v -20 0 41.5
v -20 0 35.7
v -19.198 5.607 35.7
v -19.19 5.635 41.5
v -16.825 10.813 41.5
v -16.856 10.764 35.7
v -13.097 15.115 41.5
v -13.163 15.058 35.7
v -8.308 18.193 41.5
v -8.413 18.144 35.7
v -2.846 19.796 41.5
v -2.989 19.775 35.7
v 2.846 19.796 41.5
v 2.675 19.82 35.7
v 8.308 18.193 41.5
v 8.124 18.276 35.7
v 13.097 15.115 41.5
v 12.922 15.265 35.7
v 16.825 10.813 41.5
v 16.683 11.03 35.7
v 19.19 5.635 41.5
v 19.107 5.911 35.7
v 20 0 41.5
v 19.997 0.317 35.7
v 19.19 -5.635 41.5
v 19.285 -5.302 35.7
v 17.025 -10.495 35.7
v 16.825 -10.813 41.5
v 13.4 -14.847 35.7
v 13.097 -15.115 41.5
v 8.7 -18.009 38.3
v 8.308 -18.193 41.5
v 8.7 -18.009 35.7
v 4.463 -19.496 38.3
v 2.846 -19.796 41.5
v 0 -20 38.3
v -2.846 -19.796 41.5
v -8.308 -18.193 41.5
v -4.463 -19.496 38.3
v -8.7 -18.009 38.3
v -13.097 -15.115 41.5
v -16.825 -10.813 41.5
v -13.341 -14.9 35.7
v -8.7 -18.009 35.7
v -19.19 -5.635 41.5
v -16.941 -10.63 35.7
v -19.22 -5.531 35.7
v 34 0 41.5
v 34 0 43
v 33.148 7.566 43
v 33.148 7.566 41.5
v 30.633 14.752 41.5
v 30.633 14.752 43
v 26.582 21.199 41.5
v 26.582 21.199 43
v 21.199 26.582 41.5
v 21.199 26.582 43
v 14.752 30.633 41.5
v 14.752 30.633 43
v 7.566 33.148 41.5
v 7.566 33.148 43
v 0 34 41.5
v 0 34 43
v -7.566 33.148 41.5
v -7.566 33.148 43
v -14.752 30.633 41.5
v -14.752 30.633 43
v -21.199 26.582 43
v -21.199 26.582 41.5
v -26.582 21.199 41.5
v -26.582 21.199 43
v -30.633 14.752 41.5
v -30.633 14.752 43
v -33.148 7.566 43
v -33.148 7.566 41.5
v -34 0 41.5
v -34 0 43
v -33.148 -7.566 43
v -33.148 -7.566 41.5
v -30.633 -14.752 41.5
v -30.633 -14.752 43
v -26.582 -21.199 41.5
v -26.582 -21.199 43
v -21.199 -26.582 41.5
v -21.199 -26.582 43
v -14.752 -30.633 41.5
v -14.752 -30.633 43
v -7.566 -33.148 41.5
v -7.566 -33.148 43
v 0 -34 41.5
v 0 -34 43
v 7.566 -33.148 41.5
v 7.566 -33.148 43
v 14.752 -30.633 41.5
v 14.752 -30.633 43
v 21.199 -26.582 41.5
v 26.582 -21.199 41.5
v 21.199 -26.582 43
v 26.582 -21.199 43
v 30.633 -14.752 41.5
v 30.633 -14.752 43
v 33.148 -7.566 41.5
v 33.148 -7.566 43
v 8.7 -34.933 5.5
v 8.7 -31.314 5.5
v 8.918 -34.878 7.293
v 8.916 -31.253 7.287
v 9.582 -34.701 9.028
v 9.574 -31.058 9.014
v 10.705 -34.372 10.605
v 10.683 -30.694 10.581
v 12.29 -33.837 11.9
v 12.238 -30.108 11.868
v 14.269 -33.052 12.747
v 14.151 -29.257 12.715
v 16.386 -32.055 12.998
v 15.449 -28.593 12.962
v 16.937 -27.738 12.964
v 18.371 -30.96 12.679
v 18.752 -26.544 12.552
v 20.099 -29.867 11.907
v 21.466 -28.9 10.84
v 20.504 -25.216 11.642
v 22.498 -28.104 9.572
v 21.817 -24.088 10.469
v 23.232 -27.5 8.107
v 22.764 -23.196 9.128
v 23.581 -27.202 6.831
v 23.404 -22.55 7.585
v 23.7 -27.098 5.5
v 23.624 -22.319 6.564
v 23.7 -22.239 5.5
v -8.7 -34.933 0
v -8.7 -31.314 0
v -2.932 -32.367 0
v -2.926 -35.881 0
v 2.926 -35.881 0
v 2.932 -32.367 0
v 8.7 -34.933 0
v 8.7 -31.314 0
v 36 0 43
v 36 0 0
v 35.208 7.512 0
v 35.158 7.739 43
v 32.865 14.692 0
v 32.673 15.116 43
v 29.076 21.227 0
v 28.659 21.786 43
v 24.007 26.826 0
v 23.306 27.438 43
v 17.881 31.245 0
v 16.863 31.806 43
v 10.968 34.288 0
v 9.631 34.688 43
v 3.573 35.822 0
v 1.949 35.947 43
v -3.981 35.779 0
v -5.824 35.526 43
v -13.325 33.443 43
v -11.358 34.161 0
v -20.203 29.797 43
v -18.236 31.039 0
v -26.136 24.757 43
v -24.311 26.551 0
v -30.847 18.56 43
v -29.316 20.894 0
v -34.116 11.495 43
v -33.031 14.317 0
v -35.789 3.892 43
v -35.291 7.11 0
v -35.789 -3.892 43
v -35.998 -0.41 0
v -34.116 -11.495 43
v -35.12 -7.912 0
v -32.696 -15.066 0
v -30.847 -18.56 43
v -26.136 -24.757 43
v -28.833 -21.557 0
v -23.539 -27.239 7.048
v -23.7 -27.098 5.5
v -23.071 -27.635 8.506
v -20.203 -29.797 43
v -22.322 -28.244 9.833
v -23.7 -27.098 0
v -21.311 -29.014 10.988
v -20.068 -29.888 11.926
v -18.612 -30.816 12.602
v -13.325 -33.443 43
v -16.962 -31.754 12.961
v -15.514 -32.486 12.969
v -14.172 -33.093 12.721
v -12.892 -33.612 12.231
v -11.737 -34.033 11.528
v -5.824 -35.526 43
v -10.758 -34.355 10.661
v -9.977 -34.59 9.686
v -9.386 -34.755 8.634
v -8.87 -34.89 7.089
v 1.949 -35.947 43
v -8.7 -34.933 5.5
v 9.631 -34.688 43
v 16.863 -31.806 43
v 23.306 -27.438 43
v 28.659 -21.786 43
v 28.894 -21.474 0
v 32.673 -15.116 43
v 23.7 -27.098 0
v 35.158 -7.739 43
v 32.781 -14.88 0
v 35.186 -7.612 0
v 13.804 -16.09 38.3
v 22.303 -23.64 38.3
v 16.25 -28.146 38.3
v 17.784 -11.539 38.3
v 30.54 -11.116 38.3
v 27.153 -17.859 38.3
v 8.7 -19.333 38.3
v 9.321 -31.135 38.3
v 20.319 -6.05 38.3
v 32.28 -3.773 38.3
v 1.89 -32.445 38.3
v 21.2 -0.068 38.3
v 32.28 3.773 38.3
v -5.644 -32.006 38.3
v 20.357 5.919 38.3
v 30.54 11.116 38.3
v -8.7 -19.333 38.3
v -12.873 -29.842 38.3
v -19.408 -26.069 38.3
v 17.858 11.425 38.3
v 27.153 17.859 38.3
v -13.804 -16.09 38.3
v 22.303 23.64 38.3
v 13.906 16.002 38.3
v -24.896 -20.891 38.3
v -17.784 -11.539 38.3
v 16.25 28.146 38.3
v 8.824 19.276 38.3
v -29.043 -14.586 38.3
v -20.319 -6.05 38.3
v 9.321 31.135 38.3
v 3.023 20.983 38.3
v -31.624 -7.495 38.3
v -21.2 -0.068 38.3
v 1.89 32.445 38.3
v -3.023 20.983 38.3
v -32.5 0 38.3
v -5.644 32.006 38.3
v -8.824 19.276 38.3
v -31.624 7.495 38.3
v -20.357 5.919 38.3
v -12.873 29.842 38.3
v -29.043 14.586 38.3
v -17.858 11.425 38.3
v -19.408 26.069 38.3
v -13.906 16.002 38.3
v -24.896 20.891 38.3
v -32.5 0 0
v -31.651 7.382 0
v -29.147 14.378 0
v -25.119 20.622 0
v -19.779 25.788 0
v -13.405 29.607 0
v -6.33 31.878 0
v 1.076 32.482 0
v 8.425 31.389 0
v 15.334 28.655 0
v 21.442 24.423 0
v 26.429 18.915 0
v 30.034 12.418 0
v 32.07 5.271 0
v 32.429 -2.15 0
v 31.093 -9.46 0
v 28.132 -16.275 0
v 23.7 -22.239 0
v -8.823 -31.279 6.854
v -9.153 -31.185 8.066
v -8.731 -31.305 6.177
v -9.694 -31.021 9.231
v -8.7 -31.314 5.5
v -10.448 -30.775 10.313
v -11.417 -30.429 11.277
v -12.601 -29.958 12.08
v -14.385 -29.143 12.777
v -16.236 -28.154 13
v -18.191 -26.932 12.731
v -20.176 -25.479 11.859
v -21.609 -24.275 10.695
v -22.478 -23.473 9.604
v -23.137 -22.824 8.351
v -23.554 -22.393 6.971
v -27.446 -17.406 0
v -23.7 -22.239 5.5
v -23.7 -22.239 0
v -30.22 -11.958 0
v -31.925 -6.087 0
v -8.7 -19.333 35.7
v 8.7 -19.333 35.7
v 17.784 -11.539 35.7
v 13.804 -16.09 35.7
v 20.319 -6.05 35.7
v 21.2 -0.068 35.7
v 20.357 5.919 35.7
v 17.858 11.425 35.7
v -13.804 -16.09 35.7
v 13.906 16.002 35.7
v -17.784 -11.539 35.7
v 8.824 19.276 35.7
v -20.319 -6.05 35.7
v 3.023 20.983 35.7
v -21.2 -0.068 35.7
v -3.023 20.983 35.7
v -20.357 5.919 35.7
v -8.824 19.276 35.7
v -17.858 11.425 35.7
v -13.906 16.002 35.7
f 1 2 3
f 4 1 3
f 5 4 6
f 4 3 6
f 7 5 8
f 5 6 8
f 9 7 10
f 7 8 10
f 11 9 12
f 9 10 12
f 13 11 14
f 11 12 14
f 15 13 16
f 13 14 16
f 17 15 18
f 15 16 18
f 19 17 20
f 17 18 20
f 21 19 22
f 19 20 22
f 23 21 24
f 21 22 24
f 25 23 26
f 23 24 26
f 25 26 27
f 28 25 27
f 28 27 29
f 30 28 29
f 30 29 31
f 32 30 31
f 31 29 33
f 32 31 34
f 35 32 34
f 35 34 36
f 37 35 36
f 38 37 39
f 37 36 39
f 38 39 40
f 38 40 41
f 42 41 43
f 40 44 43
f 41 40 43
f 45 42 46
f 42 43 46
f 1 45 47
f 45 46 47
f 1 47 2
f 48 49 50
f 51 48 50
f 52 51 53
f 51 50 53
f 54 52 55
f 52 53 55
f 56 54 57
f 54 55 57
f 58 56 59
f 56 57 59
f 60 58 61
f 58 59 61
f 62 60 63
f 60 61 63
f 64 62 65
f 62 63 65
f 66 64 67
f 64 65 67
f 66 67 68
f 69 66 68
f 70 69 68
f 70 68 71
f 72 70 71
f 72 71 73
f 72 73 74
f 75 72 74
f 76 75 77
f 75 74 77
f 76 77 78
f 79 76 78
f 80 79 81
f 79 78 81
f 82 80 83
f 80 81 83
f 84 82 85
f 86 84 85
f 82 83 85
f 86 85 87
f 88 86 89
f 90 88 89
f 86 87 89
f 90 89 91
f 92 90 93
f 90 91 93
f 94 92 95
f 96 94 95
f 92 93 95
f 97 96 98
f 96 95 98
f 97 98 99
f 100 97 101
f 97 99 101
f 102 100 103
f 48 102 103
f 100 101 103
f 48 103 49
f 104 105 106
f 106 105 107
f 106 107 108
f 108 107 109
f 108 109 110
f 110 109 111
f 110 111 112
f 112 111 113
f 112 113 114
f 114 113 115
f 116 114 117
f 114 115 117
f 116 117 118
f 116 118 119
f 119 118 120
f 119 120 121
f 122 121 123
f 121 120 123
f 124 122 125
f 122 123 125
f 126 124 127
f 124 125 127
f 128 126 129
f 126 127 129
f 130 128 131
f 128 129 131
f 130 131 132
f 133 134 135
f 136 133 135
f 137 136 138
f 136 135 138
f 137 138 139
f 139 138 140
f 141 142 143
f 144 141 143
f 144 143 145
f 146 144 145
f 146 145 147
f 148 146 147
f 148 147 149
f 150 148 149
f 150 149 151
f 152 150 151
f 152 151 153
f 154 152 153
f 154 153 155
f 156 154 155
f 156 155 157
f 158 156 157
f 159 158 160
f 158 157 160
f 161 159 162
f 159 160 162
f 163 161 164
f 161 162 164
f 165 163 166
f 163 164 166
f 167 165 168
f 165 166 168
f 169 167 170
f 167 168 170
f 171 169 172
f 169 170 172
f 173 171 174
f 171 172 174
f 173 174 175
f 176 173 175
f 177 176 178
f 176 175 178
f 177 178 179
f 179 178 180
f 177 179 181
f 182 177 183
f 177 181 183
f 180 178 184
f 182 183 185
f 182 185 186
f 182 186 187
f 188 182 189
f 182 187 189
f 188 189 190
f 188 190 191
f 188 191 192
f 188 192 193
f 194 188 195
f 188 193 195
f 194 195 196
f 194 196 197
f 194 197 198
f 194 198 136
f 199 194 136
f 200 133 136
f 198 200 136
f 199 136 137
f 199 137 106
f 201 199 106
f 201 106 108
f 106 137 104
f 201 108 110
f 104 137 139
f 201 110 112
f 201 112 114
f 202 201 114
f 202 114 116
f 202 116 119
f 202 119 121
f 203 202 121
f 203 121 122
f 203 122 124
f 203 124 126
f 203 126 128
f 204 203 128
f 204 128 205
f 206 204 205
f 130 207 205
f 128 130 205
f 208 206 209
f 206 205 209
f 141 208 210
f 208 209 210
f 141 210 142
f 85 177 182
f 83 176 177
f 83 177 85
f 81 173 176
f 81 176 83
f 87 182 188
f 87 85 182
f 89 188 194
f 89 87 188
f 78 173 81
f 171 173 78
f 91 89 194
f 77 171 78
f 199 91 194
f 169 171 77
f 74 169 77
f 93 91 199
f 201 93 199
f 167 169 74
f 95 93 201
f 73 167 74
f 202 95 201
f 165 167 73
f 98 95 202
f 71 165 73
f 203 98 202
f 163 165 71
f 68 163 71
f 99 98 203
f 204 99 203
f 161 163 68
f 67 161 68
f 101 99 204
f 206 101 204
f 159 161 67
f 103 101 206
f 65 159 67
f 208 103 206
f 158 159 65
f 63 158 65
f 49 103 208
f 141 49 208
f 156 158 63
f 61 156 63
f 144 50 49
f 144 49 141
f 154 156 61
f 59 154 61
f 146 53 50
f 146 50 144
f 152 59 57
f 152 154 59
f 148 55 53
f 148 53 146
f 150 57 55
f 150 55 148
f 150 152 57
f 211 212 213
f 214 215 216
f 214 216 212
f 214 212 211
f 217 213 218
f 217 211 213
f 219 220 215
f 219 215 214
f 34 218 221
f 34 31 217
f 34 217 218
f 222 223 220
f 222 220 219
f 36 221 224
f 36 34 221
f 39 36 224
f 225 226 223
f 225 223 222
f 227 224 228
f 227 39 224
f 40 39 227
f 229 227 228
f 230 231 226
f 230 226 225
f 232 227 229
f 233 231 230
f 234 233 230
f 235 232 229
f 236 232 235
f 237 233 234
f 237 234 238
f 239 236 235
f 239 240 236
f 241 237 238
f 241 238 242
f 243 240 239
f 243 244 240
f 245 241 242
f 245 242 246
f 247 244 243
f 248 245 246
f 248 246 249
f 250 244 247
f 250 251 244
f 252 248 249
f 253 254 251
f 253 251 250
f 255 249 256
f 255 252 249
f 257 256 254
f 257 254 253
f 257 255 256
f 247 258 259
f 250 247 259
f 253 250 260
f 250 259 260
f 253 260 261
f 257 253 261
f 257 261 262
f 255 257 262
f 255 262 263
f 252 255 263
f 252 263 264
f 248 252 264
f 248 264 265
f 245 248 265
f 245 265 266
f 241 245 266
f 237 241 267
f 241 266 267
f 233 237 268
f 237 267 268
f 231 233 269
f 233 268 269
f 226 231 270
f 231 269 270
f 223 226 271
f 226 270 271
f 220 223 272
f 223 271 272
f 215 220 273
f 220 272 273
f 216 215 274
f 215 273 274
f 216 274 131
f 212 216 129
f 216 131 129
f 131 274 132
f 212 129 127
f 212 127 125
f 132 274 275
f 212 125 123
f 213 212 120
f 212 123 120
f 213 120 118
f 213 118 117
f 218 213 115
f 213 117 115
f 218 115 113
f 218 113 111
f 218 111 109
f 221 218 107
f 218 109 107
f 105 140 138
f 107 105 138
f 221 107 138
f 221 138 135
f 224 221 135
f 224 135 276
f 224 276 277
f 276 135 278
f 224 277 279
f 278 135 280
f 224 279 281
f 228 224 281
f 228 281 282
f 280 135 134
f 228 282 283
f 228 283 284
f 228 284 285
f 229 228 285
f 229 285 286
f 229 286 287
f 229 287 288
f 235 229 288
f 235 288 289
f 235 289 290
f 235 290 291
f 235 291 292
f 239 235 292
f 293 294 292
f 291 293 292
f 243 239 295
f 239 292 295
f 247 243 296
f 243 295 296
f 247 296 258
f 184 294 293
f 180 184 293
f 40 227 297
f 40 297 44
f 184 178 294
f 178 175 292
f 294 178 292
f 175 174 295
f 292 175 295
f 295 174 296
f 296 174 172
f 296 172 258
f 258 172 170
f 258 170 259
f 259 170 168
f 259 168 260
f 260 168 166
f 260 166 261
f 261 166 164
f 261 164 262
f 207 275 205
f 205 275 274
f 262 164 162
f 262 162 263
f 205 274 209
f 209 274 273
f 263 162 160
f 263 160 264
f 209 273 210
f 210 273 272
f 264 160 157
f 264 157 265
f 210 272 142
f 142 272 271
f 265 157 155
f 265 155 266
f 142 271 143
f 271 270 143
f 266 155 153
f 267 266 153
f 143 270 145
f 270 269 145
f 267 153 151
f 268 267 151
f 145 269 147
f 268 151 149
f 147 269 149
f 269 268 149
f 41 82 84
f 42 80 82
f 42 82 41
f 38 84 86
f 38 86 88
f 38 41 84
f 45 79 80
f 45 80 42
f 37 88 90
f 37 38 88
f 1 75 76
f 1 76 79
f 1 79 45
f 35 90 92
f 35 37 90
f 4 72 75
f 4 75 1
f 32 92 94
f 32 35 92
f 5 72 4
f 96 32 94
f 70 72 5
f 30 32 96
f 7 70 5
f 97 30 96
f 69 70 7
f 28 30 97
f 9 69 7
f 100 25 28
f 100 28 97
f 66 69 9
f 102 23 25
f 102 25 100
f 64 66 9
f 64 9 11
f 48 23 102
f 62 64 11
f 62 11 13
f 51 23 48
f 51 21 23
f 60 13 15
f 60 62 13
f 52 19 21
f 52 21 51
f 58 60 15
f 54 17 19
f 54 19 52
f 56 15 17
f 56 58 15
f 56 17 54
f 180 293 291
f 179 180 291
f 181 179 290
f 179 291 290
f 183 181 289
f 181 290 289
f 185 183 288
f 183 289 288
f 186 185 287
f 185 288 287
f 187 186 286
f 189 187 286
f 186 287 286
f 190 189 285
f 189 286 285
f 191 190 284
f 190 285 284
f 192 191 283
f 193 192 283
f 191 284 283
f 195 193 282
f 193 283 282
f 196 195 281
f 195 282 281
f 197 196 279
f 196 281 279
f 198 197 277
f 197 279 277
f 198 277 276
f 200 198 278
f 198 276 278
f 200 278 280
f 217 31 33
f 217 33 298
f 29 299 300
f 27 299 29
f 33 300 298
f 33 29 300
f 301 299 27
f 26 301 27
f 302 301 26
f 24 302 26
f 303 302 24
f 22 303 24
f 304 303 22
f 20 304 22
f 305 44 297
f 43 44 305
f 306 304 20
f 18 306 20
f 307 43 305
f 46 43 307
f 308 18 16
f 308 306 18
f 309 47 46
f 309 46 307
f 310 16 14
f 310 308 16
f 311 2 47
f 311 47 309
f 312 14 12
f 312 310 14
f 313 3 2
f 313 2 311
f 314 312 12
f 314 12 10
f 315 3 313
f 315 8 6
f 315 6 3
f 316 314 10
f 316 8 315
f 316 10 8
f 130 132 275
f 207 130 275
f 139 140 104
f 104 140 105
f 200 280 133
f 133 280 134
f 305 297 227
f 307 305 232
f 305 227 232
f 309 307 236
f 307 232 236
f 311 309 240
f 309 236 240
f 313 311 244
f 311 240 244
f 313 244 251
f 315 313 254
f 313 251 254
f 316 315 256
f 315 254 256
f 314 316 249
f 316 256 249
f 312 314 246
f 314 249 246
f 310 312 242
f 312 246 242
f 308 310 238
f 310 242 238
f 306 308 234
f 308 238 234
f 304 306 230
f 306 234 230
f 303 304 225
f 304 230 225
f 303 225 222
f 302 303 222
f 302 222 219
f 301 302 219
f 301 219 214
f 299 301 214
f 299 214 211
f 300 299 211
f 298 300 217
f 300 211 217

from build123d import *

# Parameters (mm, degrees)
SKETCH_1_R               = 36
EXTRUDE_1_DEPTH          = 43
SKETCH_2_R               = 34
CUT_EXTRUDE_1_DEPTH      = 1.5
SKETCH_5_R               = 32.5
CUT_EXTRUDE_2_DEPTH      = 38.3
SKETCH_6_R               = 21.2
EXTRUDE_2_DEPTH          = 2.6
CUT_EXTRUDE_3_DEPTH      = 7
CUT_EXTRUDE_3_DEPTH_BACK = 8.6
SKETCH_6_3_R             = 20
CUT_EXTRUDE_4_DEPTH      = 67.640828326
CUT_EXTRUDE_5_DEPTH      = 3


with BuildPart() as part:
    # 草图1 → 凸台-拉伸1 (new body)
    with BuildSketch(Plane.XY):
        Circle(SKETCH_1_R)
    extrude(amount=EXTRUDE_1_DEPTH)

    # 草图2 → 切除-拉伸1 (cut)
    with BuildSketch(Plane.XY.offset(43)):
        Circle(SKETCH_2_R)
    extrude(amount=-CUT_EXTRUDE_1_DEPTH, mode=Mode.SUBTRACT)

    # 草图5 → 切除-拉伸2 (cut)
    with BuildSketch(Plane(origin=(0, 0, 0), x_dir=(-1, 0, 0), z_dir=(0, 0, -1))):
        Circle(SKETCH_5_R)
    extrude(amount=-CUT_EXTRUDE_2_DEPTH, mode=Mode.SUBTRACT)

    # 草图6 → 凸台-拉伸2 (add)
    with BuildSketch(Plane(origin=(0, 0, 38.3), x_dir=(-1, 0, 0), z_dir=(0, 0, -1))):
        Circle(SKETCH_6_R)
    extrude(amount=EXTRUDE_2_DEPTH)

    # 草图6<3> → 切除-拉伸3 (cut, two sides: drawn at the far end of the back side and taken through both)
    with BuildSketch(Plane(origin=(0, 0, 38.3), x_dir=(-1, 0, 0), z_dir=(0, 0, -1)).offset(-CUT_EXTRUDE_3_DEPTH_BACK)):
        Circle(SKETCH_6_3_R)
    extrude(amount=CUT_EXTRUDE_3_DEPTH + CUT_EXTRUDE_3_DEPTH_BACK, mode=Mode.SUBTRACT)

    # 草图3 → 切除-拉伸4 (cut, through all)
    with BuildSketch(Plane(origin=(0, 0, 0), x_dir=(1, 0, 0), z_dir=(0, 1, 0))):
        with BuildLine():
            Line((-23.7, 0), (-23.7, -5.5))
            ThreePointArc((-23.7, -5.5), (-16.2, -13), (-8.7, -5.5))
            Line((-8.7, -5.5), (-8.7, 0))
            Line((-8.7, 0), (-23.7, 0))
        make_face()
        with BuildLine():
            Line((8.7, 0), (8.7, -5.5))
            ThreePointArc((8.7, -5.5), (16.2, -13), (23.7, -5.5))
            Line((23.7, -5.5), (23.7, 0))
            Line((23.7, 0), (8.7, 0))
        make_face()
    extrude(amount=-CUT_EXTRUDE_4_DEPTH, mode=Mode.SUBTRACT)

    # 草图7 → 切除-拉伸5 (cut)
    with BuildSketch(Plane(origin=(0, 0, 38.3), x_dir=(-1, 0, 0), z_dir=(0, 0, -1))):
        with BuildLine():
            Line((-8.7, -18.008609052), (-8.7, -19.332614929))
            ThreePointArc((-8.7, -19.332614929), (0, -21.2), (8.7, -19.332614929))
            Line((8.7, -19.332614929), (8.7, -18.008609052))
            ThreePointArc((8.7, -18.008609052), (0, -20), (-8.7, -18.008609052))
        make_face()
    extrude(amount=CUT_EXTRUDE_5_DEPTH, mode=Mode.SUBTRACT)


solid = part.part
